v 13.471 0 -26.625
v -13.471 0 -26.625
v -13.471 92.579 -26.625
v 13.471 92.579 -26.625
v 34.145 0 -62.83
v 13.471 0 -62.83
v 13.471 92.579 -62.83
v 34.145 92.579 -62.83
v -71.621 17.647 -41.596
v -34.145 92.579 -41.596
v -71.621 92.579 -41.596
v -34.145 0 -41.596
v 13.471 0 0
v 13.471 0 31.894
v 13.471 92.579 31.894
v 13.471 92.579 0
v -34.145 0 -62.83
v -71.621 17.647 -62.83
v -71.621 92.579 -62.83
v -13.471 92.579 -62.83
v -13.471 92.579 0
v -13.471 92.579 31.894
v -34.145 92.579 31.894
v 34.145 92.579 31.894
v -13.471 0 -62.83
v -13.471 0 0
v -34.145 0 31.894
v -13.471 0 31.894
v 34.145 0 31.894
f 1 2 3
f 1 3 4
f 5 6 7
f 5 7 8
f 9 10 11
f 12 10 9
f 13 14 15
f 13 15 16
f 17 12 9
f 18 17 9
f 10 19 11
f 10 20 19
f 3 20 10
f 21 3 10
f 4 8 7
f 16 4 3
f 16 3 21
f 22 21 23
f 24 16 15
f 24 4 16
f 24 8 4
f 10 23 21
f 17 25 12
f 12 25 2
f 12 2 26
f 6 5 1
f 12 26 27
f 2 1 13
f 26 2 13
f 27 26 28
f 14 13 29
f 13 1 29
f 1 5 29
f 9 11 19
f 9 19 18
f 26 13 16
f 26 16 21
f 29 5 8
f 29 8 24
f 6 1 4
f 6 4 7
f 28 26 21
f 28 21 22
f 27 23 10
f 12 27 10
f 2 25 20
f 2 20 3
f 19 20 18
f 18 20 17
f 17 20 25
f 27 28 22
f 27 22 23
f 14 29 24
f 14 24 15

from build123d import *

# Parameters (mm, degrees)
F1_W     = 13.4705491364
F1_H     = 26.6246274114
F2_DEPTH = 92.5794709474
F3_W     = 92.5794709474
F3_H     = 21.2339237332
F4_DEPTH = 37.4759007245
F6_DEPTH = 116.4518650621


with BuildPart() as f2:
    # F1 (on face) → F2 (new body)
    with BuildSketch(Plane.XZ):
        Polygon((13.4705491364, 31.8936929107), (13.4705491364, 0), (13.4705491364, -26.6246274114), (13.4705491364, -62.8302171826), (34.1447852552, -62.8302171826), (34.1447852552, 31.8936929107), align=None)
        with Locations((6.7352745682, -13.3123137057)):
            Rectangle(F1_W, F1_H)
        with Locations((-6.7352745682, -13.3123137057)):
            Rectangle(F1_W, F1_H)
        Polygon((-13.4705491364, 0), (-13.4705491364, 31.8936929107), (-34.1447852552, 31.8936929107), (-34.1447852552, -62.8302171826), (-13.4705491364, -62.8302171826), (-13.4705491364, -26.6246274114), align=None)
    extrude(amount=-F2_DEPTH)

    # F3 (on face) → F4 (join)
    with BuildSketch(Plane(origin=(-34.1447852552, 0, 0), x_dir=(0, -1, 0), z_dir=(-1, 0, 0))):
        with Locations((-46.2897354737, -52.213255316)):
            Rectangle(F3_W, F3_H)
    extrude(amount=F4_DEPTH)

    # F5 (on face) → F6 (cut)
    with BuildSketch(Plane.XY.offset(-41.5962934494)):
        Polygon((-71.6206859797, 0), (-34.1447852552, 0), (-71.6206859797, 17.6472961903), align=None)
    extrude(amount=-F6_DEPTH, mode=Mode.SUBTRACT)


solid = f2.part
